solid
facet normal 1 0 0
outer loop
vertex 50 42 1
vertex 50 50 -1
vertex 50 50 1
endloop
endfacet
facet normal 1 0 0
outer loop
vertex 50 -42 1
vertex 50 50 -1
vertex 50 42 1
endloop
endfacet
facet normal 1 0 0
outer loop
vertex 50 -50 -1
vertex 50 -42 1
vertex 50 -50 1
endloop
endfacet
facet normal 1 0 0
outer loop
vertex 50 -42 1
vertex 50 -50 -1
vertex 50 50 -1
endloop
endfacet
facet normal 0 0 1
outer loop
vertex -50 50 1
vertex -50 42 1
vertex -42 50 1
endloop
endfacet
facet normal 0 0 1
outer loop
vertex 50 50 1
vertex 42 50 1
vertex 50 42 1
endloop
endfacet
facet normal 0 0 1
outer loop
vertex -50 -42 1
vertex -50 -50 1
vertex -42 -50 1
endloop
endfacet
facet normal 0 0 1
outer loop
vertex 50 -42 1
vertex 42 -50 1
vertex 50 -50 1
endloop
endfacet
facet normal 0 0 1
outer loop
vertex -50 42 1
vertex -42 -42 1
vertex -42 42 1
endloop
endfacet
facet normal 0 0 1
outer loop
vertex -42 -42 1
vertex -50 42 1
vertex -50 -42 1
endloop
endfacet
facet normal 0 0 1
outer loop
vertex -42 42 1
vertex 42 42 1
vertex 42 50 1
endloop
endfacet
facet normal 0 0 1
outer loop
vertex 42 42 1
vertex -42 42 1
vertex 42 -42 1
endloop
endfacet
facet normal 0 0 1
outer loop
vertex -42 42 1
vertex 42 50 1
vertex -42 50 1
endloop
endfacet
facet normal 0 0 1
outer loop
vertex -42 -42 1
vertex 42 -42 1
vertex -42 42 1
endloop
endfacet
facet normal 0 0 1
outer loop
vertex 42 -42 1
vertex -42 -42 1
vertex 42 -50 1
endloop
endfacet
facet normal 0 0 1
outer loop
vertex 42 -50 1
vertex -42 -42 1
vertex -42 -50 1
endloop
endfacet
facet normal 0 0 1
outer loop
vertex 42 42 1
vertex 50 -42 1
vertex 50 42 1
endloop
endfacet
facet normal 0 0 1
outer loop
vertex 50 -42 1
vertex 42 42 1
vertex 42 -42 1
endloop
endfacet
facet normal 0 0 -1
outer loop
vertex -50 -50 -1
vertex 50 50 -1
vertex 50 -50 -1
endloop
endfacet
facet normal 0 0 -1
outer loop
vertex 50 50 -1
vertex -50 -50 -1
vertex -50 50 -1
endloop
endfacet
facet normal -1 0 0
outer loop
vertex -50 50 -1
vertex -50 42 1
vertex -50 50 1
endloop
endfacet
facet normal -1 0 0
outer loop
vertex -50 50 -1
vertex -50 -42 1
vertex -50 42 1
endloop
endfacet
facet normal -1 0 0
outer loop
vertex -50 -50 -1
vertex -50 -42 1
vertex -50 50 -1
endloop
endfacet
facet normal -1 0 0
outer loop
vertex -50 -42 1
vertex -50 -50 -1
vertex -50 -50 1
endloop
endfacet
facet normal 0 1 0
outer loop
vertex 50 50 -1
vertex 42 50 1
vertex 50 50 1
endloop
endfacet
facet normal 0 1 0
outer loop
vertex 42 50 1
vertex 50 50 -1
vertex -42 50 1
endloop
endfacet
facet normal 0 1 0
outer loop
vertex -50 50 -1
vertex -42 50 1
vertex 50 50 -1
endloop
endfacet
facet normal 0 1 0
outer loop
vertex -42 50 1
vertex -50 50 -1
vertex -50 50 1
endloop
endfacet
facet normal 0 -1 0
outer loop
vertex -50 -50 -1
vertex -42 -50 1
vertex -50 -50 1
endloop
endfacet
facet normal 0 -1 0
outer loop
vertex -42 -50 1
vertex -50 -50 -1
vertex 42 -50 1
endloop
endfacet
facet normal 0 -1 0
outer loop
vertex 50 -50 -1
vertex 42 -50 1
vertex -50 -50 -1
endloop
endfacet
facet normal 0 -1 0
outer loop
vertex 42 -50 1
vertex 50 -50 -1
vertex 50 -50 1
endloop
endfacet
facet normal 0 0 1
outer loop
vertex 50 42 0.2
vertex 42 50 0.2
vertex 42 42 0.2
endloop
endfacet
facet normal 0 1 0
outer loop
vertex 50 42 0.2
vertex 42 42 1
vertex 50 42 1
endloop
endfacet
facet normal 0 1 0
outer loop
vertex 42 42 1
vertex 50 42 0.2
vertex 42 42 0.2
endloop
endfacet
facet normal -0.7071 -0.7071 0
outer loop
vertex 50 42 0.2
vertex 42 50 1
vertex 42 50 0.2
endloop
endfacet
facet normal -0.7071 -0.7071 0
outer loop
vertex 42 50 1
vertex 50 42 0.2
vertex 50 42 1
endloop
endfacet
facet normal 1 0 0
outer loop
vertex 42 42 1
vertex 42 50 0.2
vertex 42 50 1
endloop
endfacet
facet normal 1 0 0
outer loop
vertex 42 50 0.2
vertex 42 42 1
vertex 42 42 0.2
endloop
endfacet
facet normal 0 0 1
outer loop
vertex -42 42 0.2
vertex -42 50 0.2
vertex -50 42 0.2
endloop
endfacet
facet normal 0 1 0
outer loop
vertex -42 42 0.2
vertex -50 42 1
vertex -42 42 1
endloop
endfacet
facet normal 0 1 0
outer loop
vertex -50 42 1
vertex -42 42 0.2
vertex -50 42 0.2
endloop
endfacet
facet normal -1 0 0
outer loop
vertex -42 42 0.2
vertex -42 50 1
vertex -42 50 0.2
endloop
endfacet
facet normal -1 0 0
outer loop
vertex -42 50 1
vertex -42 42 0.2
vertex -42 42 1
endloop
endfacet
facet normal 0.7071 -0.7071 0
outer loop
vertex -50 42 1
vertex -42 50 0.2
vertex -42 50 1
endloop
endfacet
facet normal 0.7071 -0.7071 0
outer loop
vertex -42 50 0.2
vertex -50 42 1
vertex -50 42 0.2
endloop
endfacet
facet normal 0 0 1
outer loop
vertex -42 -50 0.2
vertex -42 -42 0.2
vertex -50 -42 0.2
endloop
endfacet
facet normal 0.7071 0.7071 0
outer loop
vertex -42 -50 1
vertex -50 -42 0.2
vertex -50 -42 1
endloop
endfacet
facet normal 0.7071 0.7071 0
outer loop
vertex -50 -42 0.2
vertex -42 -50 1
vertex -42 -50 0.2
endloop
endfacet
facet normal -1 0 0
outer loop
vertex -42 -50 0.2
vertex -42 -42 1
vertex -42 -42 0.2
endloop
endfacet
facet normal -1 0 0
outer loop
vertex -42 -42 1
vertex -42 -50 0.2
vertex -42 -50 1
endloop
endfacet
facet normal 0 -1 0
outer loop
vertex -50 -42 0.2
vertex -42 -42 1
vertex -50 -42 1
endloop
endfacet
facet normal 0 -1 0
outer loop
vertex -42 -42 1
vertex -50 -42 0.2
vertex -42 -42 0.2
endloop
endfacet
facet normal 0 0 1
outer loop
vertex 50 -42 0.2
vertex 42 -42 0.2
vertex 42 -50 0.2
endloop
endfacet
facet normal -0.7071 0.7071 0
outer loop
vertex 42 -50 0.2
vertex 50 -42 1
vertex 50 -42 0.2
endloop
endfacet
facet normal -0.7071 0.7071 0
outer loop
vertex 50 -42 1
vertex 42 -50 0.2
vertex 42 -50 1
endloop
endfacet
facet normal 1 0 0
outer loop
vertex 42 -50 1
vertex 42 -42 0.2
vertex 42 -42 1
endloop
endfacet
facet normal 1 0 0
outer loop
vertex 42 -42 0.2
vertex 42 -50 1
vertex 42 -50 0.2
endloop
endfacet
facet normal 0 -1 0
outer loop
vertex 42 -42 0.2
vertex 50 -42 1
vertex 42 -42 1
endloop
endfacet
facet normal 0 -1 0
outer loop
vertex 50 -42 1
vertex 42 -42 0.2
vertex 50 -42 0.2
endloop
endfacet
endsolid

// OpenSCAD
$fn=64;

plate_x = 100;
plate_y = 100;
plate_t = 2;

corner_relief = 8;
relief_depth = 0.8;

module corner_cut(sx, sy) {
    translate([sx*(plate_x/2 - corner_relief), sy*(plate_y/2 - corner_relief), plate_t/2 - relief_depth])
        linear_extrude(height=relief_depth)
            polygon(points=[
                [0,0],
                [sx*corner_relief,0],
                [0,sy*corner_relief]
            ]);
}

difference() {
    translate([-plate_x/2, -plate_y/2, -plate_t/2])
        cube([plate_x, plate_y, plate_t], center=false);

    corner_cut( 1, 1);
    corner_cut(-1, 1);
    corner_cut(-1,-1);
    corner_cut( 1,-1);
}
